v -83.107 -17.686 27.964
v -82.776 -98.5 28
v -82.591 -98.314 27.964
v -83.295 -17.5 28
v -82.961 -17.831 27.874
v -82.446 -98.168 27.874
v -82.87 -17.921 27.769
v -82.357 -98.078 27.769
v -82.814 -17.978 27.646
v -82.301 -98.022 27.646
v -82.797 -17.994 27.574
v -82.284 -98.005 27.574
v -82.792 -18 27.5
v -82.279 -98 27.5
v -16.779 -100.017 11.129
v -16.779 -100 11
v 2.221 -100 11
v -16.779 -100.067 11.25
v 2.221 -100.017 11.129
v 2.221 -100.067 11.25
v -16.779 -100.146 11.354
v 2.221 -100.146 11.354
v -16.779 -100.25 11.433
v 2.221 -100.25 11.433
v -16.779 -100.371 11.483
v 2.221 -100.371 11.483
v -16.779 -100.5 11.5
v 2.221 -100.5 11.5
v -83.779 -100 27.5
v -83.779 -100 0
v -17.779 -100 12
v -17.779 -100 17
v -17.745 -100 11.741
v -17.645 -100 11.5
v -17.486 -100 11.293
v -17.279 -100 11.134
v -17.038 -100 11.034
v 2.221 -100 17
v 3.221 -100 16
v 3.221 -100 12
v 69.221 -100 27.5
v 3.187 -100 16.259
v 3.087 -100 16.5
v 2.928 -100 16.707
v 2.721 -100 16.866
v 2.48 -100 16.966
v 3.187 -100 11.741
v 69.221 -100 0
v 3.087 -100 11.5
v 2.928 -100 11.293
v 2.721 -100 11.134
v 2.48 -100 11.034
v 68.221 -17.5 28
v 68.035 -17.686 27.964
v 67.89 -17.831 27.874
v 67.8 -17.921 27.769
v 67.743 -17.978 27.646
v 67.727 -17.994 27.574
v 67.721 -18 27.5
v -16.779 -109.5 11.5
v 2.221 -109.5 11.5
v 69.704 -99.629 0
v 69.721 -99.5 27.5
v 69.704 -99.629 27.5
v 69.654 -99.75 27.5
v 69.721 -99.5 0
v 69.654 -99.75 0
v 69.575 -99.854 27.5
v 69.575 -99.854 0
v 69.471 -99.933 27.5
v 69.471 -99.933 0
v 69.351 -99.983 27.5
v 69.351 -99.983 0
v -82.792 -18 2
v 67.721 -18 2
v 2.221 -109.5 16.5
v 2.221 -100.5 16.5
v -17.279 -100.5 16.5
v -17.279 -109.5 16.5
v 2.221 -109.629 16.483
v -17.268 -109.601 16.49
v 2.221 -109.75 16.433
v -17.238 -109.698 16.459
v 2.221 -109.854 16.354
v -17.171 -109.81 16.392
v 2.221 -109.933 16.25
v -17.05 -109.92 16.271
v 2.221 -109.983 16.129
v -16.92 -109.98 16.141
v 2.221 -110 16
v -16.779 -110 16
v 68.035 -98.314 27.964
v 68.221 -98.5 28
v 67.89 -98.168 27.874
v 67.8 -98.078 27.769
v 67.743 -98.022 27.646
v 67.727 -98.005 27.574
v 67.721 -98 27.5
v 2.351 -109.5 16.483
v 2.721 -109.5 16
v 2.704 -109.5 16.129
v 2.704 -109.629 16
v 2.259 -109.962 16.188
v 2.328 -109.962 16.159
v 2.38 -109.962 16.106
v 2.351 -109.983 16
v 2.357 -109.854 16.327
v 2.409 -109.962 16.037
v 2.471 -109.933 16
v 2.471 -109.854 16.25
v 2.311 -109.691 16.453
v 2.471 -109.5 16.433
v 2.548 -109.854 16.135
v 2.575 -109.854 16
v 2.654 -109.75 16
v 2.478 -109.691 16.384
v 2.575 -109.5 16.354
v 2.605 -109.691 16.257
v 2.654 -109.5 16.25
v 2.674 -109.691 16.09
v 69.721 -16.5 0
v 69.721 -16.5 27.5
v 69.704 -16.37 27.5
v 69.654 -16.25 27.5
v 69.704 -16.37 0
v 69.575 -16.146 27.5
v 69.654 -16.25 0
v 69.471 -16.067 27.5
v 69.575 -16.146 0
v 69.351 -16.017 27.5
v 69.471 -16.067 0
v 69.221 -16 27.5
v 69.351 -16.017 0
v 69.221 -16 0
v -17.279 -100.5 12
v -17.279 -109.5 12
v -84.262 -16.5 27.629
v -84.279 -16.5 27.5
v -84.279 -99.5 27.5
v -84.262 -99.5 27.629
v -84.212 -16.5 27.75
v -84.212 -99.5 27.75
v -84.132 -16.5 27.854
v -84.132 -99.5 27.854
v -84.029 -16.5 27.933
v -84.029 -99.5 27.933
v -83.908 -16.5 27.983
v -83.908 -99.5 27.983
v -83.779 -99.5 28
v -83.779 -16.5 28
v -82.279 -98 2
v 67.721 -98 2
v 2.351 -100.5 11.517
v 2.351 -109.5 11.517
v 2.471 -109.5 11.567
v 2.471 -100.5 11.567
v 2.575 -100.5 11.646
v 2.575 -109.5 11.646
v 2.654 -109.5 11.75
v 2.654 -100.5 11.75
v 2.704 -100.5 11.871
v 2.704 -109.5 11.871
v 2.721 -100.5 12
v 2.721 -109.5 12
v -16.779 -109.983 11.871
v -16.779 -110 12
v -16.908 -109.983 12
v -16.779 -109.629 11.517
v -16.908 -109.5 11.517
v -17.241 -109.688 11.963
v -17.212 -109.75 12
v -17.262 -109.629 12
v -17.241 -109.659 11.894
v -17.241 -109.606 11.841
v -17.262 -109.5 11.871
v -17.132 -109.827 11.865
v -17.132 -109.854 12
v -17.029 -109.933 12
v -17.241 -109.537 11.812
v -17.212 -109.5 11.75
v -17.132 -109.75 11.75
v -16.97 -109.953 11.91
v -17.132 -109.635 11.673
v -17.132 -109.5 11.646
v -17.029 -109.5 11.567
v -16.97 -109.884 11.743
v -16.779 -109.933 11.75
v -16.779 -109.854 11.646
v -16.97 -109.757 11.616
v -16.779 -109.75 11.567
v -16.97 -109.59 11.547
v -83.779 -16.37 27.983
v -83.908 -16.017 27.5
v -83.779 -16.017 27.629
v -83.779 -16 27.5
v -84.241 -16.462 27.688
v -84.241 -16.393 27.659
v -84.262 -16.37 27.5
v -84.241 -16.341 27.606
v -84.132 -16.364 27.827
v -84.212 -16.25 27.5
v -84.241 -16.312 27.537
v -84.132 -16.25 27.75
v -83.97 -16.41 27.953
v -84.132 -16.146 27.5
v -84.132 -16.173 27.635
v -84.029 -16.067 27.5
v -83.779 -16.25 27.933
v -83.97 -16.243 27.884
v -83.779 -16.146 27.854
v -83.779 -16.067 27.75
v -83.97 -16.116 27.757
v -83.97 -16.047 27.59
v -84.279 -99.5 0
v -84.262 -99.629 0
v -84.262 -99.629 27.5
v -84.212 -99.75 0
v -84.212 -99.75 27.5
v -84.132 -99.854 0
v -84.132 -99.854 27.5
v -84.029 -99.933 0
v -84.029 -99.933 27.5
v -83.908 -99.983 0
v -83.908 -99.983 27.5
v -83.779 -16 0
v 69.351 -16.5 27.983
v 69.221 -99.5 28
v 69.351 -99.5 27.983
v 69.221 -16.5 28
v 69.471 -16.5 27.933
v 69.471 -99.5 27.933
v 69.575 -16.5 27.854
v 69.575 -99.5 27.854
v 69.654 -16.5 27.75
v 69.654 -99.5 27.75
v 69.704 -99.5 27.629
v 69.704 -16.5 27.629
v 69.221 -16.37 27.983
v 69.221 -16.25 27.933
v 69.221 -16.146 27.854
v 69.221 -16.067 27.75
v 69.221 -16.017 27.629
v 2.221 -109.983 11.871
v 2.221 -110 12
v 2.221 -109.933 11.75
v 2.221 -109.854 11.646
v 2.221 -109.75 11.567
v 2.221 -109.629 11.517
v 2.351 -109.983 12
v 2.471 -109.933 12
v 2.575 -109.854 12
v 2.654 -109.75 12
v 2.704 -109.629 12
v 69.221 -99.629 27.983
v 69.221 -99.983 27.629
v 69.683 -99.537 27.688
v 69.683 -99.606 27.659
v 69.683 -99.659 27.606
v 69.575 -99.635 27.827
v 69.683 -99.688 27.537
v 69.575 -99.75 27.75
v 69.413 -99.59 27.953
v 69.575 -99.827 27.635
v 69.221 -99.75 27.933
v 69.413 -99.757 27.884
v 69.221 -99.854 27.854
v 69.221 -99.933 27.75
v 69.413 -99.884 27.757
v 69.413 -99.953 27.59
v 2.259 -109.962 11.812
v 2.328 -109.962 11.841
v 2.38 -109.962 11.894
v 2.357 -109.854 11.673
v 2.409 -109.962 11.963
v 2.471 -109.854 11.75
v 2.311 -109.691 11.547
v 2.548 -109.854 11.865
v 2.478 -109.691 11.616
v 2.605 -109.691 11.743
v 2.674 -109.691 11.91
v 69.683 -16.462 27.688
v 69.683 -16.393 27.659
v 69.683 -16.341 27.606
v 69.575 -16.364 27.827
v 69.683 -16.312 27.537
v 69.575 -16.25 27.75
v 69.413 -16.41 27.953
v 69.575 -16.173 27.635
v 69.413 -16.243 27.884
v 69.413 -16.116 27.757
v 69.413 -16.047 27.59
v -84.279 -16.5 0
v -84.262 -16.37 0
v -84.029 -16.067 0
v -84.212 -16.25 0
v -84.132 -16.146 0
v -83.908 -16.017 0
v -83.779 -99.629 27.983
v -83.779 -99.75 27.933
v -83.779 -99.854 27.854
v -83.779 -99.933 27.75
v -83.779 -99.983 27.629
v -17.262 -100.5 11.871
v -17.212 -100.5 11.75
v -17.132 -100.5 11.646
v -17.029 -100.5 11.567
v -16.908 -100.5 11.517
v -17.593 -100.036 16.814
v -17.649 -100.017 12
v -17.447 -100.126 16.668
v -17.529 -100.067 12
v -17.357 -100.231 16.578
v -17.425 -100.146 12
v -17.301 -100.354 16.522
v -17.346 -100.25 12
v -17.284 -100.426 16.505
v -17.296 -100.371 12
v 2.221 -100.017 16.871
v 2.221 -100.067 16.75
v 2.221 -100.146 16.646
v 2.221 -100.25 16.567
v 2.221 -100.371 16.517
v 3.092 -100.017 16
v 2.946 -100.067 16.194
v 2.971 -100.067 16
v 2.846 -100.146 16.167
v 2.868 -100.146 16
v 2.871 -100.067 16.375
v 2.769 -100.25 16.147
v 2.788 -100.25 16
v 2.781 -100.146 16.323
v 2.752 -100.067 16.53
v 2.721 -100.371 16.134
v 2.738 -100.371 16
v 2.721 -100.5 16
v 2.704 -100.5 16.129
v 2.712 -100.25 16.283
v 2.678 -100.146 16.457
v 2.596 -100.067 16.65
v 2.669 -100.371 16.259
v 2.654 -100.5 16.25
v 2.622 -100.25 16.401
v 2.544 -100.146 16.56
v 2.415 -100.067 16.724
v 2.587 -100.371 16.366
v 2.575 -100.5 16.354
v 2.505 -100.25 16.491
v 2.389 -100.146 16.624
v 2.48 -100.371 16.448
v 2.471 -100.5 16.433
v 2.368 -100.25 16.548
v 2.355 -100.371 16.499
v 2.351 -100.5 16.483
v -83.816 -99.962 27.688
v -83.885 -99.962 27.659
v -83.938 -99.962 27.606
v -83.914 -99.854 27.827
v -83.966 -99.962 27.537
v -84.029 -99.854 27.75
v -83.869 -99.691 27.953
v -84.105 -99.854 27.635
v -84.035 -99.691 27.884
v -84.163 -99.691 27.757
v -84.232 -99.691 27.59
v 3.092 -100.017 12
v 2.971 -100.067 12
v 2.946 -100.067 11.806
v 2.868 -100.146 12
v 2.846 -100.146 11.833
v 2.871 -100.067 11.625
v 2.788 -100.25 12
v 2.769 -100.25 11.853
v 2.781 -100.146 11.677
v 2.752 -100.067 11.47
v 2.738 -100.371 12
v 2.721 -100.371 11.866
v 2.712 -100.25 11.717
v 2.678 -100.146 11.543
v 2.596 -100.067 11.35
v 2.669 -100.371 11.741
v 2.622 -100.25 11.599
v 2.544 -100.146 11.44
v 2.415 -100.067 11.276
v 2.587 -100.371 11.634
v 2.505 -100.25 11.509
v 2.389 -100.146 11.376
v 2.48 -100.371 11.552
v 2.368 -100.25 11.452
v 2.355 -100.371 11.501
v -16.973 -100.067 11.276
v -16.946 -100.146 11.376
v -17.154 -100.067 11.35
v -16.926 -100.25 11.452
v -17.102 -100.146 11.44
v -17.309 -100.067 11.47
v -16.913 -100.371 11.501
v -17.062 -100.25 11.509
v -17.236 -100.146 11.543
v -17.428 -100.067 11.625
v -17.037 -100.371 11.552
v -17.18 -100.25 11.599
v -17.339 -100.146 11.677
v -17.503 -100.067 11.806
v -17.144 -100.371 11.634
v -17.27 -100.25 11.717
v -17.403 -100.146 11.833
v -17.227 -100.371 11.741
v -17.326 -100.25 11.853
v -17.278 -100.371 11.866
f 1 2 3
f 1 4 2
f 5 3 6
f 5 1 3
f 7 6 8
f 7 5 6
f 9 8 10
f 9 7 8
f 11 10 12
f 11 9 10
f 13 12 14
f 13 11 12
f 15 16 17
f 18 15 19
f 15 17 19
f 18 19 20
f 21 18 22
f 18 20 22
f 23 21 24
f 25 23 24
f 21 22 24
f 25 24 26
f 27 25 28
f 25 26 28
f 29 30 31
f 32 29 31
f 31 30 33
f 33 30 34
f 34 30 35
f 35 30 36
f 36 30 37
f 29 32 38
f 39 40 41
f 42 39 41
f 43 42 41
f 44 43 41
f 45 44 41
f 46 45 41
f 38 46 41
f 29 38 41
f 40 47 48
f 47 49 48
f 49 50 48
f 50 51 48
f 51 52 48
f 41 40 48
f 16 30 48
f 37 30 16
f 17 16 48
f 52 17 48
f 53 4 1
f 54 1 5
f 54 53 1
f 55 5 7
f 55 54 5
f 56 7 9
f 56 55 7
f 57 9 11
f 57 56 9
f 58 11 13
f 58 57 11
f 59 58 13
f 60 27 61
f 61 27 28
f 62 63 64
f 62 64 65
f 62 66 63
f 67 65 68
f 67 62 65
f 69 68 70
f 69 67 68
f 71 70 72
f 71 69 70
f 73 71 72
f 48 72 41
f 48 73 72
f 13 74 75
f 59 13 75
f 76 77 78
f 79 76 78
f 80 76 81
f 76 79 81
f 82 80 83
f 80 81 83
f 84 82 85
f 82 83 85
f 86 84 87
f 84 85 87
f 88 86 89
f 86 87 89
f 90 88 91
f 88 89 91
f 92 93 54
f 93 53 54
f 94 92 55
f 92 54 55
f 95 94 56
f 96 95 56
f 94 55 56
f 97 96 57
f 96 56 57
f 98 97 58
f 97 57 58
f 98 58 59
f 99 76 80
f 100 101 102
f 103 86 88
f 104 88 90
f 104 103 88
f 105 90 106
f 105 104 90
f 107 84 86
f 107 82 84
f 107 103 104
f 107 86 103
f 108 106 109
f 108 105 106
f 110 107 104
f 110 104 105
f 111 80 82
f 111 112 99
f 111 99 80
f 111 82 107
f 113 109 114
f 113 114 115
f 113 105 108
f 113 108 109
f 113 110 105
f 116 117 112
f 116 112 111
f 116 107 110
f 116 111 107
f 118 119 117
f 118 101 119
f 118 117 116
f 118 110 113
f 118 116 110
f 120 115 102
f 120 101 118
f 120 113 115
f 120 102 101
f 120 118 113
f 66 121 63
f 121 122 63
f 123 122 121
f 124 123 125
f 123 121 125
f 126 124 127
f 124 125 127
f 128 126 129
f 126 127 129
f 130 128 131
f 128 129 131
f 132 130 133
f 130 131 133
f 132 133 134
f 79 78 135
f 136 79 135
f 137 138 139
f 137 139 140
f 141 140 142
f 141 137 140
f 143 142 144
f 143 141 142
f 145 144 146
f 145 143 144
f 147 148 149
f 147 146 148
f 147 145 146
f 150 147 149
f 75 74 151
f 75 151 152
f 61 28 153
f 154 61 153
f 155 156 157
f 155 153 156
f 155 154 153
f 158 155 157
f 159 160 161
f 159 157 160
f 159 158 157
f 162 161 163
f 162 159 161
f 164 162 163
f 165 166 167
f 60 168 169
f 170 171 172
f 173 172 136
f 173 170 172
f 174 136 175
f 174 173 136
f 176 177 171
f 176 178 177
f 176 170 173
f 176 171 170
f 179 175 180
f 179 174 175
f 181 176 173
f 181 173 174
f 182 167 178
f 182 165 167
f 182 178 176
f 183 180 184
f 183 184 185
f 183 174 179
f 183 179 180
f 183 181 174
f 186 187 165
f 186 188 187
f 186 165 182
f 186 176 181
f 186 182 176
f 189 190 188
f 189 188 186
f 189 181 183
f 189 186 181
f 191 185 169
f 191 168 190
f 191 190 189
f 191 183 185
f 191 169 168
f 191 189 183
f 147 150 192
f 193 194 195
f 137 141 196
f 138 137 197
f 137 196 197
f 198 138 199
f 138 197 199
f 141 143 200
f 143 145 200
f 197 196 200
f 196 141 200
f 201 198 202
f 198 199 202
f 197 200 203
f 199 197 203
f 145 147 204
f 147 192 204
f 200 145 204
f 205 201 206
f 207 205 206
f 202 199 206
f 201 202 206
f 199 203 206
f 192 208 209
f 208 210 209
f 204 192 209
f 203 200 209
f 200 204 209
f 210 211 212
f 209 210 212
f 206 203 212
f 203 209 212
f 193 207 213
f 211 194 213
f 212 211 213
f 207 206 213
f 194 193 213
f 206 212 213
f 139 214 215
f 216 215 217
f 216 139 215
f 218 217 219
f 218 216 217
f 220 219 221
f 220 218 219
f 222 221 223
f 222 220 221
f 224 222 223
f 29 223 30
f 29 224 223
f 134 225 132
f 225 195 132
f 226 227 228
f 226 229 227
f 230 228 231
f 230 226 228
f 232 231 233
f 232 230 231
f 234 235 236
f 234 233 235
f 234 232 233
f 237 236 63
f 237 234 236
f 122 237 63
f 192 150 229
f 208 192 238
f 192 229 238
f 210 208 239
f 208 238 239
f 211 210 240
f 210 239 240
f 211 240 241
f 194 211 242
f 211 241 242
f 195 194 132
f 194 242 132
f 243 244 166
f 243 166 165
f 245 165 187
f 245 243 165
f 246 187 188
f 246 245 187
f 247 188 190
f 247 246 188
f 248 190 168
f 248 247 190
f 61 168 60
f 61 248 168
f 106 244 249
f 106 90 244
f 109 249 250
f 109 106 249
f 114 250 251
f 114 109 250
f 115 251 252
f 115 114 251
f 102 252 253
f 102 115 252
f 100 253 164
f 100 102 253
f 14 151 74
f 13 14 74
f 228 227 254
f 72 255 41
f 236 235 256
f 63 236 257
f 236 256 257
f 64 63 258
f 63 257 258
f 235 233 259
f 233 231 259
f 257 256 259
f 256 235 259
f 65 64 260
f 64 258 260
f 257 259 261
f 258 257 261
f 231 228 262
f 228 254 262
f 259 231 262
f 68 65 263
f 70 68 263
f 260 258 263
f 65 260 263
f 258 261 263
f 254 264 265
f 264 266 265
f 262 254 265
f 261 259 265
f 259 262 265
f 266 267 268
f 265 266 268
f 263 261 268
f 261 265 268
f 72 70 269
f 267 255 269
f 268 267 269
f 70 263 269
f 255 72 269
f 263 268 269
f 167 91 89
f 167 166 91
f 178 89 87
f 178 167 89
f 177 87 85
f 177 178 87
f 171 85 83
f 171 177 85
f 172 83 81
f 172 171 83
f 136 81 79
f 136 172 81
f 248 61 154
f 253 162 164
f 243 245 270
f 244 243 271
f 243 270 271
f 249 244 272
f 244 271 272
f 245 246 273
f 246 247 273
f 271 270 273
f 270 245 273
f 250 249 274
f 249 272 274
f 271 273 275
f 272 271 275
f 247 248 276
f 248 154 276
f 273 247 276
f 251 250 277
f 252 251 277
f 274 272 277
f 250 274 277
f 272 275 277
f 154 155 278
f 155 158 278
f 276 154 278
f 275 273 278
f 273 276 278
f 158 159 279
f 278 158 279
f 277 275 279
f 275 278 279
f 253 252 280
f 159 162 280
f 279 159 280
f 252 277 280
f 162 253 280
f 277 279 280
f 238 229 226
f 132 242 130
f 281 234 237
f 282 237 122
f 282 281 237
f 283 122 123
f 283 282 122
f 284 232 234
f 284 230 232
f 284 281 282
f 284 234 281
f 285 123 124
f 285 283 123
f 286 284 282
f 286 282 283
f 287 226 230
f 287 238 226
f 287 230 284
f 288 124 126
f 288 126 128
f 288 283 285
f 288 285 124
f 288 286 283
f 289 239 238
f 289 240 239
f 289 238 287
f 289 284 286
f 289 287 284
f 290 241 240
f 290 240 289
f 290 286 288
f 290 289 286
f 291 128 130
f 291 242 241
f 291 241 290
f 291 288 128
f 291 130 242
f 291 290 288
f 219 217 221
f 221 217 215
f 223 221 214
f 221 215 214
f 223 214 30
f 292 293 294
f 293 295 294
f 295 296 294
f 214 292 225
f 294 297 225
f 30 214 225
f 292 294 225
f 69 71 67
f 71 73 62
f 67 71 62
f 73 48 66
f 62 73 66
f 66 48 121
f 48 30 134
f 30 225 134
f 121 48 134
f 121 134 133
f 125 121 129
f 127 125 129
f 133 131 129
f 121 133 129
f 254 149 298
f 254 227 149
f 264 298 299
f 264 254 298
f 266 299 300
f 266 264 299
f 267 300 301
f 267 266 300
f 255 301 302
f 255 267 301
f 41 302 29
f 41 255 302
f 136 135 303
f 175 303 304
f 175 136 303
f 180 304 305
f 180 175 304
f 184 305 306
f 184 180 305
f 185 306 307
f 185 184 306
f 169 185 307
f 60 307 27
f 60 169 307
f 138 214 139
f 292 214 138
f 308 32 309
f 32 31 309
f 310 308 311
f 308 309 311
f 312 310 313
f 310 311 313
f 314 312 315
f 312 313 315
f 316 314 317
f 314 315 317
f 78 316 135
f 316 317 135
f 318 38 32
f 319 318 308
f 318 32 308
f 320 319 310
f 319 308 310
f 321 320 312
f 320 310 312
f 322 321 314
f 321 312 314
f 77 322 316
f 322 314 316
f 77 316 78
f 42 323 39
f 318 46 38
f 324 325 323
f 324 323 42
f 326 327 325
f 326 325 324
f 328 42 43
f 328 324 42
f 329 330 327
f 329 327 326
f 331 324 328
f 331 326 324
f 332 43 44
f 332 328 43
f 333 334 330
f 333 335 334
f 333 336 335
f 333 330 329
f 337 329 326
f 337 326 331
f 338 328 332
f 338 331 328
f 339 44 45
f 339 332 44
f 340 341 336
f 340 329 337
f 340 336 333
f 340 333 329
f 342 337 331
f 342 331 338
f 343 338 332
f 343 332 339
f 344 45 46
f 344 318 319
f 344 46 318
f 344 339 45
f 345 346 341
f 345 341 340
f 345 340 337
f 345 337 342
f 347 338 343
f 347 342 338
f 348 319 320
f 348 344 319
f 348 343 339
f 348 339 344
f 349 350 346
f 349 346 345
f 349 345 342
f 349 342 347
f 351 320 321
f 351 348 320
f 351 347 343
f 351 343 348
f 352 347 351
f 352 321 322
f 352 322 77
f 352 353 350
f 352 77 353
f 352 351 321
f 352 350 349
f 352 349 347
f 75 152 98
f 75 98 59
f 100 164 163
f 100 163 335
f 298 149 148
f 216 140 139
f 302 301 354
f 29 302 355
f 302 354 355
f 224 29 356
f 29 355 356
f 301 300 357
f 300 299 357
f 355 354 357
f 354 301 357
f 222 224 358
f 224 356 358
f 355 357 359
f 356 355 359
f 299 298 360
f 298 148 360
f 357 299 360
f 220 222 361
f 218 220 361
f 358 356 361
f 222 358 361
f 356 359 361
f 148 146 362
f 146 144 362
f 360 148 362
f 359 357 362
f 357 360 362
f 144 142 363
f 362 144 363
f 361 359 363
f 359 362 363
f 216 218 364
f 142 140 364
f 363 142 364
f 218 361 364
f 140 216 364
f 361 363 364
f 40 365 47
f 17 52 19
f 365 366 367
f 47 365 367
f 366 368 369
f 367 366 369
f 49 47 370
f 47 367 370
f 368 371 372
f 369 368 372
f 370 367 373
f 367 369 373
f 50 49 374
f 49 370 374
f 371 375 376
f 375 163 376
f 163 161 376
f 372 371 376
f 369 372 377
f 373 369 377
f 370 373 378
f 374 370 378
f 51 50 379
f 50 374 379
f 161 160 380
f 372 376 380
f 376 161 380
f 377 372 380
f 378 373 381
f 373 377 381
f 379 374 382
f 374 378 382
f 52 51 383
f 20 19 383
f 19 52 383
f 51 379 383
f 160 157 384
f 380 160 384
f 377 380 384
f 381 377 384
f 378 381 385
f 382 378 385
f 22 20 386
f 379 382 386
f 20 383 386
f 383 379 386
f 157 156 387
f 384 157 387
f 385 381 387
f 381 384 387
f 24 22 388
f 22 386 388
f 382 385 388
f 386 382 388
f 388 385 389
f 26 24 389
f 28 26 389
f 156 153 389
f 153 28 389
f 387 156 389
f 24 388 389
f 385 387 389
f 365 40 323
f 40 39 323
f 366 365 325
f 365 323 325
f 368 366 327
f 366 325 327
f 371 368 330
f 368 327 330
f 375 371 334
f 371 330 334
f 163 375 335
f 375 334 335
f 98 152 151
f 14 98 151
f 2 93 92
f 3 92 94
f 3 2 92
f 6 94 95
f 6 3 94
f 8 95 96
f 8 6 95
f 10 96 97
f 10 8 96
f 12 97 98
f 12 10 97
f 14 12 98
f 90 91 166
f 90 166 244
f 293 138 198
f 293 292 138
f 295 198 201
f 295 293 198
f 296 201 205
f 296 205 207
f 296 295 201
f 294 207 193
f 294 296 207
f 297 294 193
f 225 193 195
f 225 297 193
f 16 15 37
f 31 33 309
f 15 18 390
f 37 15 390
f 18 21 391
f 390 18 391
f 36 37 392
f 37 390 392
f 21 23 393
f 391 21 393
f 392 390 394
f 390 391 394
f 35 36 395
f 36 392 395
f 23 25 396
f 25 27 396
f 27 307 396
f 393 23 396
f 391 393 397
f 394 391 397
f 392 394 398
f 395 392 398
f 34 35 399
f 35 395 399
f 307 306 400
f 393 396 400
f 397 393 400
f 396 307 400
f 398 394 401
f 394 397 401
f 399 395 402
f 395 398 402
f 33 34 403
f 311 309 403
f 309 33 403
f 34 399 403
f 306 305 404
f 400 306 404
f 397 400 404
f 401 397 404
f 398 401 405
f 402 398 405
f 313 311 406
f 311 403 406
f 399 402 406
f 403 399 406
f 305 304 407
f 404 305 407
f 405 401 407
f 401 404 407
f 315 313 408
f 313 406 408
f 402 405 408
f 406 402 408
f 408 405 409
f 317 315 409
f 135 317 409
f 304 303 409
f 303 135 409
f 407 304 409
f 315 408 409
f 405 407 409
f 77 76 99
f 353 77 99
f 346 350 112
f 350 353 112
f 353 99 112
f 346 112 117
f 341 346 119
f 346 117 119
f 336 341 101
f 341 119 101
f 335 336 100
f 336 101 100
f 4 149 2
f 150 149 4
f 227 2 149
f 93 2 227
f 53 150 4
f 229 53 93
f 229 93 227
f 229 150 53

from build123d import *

# Parameters (mm, degrees)
F0_W      = 170
F0_H      = 100
F1_DEPTH  = 2
F2_W      = 170
F2_H      = 100
F3_DEPTH  = 26
F4_W      = 2
F4_H      = 96
F5_DEPTH  = 26
F6_W      = 14
F6_H      = 96
F7_DEPTH  = 30
F8_W      = 10
F8_H      = 2.5
F9_DEPTH  = 10
F11_DEPTH = 26
F13_DEPTH = 30
F14_R     = 0.5


with BuildPart() as f1:
    # F0 (on Top) → F1 (new body)
    with BuildSketch(Plane.XY):
        with Locations((0.7212153077, -50)):
            Rectangle(F0_W, F0_H)
    extrude(amount=F1_DEPTH)

    # F2 (on face) → F3 (join)
    with BuildSketch(Plane.XY.offset(2)):
        with Locations((0.7212153077, -50)):
            Rectangle(F2_W, F2_H)
        Polygon((83.7212153077, -2), (83.7212153077, -98), (-82.2787846923, -98), (-82.8941488059, -2), align=None, mode=Mode.SUBTRACT)
    extrude(amount=F3_DEPTH)

    # F4 (on face) → F5 (join)
    with BuildSketch(Plane.XY.offset(2)):
        with Locations((68.7212153077, -50)):
            Rectangle(F4_W, F4_H)
    extrude(amount=F5_DEPTH)

    # F6 (on face) → F7 (cut)
    with BuildSketch(Plane.XY.offset(28)):
        with Locations((76.7212153077, -50)):
            Rectangle(F6_W, F6_H)
        Polygon((83.7212153077, -98), (69.7212153077, -98), (69.7212153077, -100), (85.7212153077, -100), (85.7212153077, 0), (69.7212153077, 0), (69.7212153077, -2), (83.7212153077, -2), align=None)
    extrude(amount=-F7_DEPTH, mode=Mode.SUBTRACT)

    # F8 (on face) → F9 (join)
    with BuildSketch(Plane.XZ.offset(100)):
        with Locations((-2.2787846923, 15.25)):
            Rectangle(F8_W, F8_H)
        with Locations((-12.2787846923, 15.25)):
            Rectangle(F8_W, F8_H)
        with Locations((-12.2787846923, 12.75)):
            Rectangle(F8_W, F8_H)
        with Locations((-2.2787846923, 12.75)):
            Rectangle(F8_W, F8_H)
    extrude(amount=F9_DEPTH)

    # F10 (on face) → F11 (join)
    with BuildSketch(Plane.XY.offset(2)):
        Polygon((67.7212153077, -15.9997123883), (-82.8044100496, -15.9997123883), (-82.7915902273, -17.9996713009), (67.7212153077, -17.9996713009), align=None)
    extrude(amount=F11_DEPTH)

    # F12 (on face) → F13 (cut)
    with BuildSketch(Plane.XY.offset(28)):
        Polygon((-84.2787846923, -15.9997123883), (-82.8044100496, -15.9997123883), (-82.8941488059, -2), (67.7212153077, -2), (67.7212153077, -15.9997123883), (69.7212153077, -15.9997123883), (69.7212153077, 0), (-84.2787846923, 0), align=None)
        Polygon((-82.8941488059, -2), (-82.8044100496, -15.9997123883), (67.7212153077, -15.9997123883), (67.7212153077, -2), align=None)
    extrude(amount=-F13_DEPTH, mode=Mode.SUBTRACT)

    # F14
    f14_edges = [f1.edges().sort_by_distance(p)[0] for p in [
        (-82.535187, -57.999836, 28),
        (-7.535187, -17.999671, 28),
        (-7.278785, -15.999712, 28),
        (-84.278785, -57.999856, 28),
        (-7.278785, -98, 28),
        (-7.278785, -100, 28),
        (67.721215, -57.999836, 28),
        (69.721215, -57.999856, 28),
        (69.721215, -15.999712, 14),
        (69.721215, -100, 14),
        (2.721215, -105, 16.5),
        (2.721215, -105, 11.5),
        (2.721215, -100, 14),
        (-7.278785, -100, 16.5),
        (-7.278785, -110, 16.5),
        (-7.278785, -110, 11.5),
        (-17.278785, -110, 14),
        (-84.278785, -100, 14),
        (-84.278785, -15.999712, 14),
        (-17.278785, -100, 14),
        (-17.278785, -105, 11.5),
        (2.721215, -110, 14),
        (-7.278785, -100, 11.5),
    ]]
    fillet(f14_edges, radius=F14_R)


solid = f1.part
